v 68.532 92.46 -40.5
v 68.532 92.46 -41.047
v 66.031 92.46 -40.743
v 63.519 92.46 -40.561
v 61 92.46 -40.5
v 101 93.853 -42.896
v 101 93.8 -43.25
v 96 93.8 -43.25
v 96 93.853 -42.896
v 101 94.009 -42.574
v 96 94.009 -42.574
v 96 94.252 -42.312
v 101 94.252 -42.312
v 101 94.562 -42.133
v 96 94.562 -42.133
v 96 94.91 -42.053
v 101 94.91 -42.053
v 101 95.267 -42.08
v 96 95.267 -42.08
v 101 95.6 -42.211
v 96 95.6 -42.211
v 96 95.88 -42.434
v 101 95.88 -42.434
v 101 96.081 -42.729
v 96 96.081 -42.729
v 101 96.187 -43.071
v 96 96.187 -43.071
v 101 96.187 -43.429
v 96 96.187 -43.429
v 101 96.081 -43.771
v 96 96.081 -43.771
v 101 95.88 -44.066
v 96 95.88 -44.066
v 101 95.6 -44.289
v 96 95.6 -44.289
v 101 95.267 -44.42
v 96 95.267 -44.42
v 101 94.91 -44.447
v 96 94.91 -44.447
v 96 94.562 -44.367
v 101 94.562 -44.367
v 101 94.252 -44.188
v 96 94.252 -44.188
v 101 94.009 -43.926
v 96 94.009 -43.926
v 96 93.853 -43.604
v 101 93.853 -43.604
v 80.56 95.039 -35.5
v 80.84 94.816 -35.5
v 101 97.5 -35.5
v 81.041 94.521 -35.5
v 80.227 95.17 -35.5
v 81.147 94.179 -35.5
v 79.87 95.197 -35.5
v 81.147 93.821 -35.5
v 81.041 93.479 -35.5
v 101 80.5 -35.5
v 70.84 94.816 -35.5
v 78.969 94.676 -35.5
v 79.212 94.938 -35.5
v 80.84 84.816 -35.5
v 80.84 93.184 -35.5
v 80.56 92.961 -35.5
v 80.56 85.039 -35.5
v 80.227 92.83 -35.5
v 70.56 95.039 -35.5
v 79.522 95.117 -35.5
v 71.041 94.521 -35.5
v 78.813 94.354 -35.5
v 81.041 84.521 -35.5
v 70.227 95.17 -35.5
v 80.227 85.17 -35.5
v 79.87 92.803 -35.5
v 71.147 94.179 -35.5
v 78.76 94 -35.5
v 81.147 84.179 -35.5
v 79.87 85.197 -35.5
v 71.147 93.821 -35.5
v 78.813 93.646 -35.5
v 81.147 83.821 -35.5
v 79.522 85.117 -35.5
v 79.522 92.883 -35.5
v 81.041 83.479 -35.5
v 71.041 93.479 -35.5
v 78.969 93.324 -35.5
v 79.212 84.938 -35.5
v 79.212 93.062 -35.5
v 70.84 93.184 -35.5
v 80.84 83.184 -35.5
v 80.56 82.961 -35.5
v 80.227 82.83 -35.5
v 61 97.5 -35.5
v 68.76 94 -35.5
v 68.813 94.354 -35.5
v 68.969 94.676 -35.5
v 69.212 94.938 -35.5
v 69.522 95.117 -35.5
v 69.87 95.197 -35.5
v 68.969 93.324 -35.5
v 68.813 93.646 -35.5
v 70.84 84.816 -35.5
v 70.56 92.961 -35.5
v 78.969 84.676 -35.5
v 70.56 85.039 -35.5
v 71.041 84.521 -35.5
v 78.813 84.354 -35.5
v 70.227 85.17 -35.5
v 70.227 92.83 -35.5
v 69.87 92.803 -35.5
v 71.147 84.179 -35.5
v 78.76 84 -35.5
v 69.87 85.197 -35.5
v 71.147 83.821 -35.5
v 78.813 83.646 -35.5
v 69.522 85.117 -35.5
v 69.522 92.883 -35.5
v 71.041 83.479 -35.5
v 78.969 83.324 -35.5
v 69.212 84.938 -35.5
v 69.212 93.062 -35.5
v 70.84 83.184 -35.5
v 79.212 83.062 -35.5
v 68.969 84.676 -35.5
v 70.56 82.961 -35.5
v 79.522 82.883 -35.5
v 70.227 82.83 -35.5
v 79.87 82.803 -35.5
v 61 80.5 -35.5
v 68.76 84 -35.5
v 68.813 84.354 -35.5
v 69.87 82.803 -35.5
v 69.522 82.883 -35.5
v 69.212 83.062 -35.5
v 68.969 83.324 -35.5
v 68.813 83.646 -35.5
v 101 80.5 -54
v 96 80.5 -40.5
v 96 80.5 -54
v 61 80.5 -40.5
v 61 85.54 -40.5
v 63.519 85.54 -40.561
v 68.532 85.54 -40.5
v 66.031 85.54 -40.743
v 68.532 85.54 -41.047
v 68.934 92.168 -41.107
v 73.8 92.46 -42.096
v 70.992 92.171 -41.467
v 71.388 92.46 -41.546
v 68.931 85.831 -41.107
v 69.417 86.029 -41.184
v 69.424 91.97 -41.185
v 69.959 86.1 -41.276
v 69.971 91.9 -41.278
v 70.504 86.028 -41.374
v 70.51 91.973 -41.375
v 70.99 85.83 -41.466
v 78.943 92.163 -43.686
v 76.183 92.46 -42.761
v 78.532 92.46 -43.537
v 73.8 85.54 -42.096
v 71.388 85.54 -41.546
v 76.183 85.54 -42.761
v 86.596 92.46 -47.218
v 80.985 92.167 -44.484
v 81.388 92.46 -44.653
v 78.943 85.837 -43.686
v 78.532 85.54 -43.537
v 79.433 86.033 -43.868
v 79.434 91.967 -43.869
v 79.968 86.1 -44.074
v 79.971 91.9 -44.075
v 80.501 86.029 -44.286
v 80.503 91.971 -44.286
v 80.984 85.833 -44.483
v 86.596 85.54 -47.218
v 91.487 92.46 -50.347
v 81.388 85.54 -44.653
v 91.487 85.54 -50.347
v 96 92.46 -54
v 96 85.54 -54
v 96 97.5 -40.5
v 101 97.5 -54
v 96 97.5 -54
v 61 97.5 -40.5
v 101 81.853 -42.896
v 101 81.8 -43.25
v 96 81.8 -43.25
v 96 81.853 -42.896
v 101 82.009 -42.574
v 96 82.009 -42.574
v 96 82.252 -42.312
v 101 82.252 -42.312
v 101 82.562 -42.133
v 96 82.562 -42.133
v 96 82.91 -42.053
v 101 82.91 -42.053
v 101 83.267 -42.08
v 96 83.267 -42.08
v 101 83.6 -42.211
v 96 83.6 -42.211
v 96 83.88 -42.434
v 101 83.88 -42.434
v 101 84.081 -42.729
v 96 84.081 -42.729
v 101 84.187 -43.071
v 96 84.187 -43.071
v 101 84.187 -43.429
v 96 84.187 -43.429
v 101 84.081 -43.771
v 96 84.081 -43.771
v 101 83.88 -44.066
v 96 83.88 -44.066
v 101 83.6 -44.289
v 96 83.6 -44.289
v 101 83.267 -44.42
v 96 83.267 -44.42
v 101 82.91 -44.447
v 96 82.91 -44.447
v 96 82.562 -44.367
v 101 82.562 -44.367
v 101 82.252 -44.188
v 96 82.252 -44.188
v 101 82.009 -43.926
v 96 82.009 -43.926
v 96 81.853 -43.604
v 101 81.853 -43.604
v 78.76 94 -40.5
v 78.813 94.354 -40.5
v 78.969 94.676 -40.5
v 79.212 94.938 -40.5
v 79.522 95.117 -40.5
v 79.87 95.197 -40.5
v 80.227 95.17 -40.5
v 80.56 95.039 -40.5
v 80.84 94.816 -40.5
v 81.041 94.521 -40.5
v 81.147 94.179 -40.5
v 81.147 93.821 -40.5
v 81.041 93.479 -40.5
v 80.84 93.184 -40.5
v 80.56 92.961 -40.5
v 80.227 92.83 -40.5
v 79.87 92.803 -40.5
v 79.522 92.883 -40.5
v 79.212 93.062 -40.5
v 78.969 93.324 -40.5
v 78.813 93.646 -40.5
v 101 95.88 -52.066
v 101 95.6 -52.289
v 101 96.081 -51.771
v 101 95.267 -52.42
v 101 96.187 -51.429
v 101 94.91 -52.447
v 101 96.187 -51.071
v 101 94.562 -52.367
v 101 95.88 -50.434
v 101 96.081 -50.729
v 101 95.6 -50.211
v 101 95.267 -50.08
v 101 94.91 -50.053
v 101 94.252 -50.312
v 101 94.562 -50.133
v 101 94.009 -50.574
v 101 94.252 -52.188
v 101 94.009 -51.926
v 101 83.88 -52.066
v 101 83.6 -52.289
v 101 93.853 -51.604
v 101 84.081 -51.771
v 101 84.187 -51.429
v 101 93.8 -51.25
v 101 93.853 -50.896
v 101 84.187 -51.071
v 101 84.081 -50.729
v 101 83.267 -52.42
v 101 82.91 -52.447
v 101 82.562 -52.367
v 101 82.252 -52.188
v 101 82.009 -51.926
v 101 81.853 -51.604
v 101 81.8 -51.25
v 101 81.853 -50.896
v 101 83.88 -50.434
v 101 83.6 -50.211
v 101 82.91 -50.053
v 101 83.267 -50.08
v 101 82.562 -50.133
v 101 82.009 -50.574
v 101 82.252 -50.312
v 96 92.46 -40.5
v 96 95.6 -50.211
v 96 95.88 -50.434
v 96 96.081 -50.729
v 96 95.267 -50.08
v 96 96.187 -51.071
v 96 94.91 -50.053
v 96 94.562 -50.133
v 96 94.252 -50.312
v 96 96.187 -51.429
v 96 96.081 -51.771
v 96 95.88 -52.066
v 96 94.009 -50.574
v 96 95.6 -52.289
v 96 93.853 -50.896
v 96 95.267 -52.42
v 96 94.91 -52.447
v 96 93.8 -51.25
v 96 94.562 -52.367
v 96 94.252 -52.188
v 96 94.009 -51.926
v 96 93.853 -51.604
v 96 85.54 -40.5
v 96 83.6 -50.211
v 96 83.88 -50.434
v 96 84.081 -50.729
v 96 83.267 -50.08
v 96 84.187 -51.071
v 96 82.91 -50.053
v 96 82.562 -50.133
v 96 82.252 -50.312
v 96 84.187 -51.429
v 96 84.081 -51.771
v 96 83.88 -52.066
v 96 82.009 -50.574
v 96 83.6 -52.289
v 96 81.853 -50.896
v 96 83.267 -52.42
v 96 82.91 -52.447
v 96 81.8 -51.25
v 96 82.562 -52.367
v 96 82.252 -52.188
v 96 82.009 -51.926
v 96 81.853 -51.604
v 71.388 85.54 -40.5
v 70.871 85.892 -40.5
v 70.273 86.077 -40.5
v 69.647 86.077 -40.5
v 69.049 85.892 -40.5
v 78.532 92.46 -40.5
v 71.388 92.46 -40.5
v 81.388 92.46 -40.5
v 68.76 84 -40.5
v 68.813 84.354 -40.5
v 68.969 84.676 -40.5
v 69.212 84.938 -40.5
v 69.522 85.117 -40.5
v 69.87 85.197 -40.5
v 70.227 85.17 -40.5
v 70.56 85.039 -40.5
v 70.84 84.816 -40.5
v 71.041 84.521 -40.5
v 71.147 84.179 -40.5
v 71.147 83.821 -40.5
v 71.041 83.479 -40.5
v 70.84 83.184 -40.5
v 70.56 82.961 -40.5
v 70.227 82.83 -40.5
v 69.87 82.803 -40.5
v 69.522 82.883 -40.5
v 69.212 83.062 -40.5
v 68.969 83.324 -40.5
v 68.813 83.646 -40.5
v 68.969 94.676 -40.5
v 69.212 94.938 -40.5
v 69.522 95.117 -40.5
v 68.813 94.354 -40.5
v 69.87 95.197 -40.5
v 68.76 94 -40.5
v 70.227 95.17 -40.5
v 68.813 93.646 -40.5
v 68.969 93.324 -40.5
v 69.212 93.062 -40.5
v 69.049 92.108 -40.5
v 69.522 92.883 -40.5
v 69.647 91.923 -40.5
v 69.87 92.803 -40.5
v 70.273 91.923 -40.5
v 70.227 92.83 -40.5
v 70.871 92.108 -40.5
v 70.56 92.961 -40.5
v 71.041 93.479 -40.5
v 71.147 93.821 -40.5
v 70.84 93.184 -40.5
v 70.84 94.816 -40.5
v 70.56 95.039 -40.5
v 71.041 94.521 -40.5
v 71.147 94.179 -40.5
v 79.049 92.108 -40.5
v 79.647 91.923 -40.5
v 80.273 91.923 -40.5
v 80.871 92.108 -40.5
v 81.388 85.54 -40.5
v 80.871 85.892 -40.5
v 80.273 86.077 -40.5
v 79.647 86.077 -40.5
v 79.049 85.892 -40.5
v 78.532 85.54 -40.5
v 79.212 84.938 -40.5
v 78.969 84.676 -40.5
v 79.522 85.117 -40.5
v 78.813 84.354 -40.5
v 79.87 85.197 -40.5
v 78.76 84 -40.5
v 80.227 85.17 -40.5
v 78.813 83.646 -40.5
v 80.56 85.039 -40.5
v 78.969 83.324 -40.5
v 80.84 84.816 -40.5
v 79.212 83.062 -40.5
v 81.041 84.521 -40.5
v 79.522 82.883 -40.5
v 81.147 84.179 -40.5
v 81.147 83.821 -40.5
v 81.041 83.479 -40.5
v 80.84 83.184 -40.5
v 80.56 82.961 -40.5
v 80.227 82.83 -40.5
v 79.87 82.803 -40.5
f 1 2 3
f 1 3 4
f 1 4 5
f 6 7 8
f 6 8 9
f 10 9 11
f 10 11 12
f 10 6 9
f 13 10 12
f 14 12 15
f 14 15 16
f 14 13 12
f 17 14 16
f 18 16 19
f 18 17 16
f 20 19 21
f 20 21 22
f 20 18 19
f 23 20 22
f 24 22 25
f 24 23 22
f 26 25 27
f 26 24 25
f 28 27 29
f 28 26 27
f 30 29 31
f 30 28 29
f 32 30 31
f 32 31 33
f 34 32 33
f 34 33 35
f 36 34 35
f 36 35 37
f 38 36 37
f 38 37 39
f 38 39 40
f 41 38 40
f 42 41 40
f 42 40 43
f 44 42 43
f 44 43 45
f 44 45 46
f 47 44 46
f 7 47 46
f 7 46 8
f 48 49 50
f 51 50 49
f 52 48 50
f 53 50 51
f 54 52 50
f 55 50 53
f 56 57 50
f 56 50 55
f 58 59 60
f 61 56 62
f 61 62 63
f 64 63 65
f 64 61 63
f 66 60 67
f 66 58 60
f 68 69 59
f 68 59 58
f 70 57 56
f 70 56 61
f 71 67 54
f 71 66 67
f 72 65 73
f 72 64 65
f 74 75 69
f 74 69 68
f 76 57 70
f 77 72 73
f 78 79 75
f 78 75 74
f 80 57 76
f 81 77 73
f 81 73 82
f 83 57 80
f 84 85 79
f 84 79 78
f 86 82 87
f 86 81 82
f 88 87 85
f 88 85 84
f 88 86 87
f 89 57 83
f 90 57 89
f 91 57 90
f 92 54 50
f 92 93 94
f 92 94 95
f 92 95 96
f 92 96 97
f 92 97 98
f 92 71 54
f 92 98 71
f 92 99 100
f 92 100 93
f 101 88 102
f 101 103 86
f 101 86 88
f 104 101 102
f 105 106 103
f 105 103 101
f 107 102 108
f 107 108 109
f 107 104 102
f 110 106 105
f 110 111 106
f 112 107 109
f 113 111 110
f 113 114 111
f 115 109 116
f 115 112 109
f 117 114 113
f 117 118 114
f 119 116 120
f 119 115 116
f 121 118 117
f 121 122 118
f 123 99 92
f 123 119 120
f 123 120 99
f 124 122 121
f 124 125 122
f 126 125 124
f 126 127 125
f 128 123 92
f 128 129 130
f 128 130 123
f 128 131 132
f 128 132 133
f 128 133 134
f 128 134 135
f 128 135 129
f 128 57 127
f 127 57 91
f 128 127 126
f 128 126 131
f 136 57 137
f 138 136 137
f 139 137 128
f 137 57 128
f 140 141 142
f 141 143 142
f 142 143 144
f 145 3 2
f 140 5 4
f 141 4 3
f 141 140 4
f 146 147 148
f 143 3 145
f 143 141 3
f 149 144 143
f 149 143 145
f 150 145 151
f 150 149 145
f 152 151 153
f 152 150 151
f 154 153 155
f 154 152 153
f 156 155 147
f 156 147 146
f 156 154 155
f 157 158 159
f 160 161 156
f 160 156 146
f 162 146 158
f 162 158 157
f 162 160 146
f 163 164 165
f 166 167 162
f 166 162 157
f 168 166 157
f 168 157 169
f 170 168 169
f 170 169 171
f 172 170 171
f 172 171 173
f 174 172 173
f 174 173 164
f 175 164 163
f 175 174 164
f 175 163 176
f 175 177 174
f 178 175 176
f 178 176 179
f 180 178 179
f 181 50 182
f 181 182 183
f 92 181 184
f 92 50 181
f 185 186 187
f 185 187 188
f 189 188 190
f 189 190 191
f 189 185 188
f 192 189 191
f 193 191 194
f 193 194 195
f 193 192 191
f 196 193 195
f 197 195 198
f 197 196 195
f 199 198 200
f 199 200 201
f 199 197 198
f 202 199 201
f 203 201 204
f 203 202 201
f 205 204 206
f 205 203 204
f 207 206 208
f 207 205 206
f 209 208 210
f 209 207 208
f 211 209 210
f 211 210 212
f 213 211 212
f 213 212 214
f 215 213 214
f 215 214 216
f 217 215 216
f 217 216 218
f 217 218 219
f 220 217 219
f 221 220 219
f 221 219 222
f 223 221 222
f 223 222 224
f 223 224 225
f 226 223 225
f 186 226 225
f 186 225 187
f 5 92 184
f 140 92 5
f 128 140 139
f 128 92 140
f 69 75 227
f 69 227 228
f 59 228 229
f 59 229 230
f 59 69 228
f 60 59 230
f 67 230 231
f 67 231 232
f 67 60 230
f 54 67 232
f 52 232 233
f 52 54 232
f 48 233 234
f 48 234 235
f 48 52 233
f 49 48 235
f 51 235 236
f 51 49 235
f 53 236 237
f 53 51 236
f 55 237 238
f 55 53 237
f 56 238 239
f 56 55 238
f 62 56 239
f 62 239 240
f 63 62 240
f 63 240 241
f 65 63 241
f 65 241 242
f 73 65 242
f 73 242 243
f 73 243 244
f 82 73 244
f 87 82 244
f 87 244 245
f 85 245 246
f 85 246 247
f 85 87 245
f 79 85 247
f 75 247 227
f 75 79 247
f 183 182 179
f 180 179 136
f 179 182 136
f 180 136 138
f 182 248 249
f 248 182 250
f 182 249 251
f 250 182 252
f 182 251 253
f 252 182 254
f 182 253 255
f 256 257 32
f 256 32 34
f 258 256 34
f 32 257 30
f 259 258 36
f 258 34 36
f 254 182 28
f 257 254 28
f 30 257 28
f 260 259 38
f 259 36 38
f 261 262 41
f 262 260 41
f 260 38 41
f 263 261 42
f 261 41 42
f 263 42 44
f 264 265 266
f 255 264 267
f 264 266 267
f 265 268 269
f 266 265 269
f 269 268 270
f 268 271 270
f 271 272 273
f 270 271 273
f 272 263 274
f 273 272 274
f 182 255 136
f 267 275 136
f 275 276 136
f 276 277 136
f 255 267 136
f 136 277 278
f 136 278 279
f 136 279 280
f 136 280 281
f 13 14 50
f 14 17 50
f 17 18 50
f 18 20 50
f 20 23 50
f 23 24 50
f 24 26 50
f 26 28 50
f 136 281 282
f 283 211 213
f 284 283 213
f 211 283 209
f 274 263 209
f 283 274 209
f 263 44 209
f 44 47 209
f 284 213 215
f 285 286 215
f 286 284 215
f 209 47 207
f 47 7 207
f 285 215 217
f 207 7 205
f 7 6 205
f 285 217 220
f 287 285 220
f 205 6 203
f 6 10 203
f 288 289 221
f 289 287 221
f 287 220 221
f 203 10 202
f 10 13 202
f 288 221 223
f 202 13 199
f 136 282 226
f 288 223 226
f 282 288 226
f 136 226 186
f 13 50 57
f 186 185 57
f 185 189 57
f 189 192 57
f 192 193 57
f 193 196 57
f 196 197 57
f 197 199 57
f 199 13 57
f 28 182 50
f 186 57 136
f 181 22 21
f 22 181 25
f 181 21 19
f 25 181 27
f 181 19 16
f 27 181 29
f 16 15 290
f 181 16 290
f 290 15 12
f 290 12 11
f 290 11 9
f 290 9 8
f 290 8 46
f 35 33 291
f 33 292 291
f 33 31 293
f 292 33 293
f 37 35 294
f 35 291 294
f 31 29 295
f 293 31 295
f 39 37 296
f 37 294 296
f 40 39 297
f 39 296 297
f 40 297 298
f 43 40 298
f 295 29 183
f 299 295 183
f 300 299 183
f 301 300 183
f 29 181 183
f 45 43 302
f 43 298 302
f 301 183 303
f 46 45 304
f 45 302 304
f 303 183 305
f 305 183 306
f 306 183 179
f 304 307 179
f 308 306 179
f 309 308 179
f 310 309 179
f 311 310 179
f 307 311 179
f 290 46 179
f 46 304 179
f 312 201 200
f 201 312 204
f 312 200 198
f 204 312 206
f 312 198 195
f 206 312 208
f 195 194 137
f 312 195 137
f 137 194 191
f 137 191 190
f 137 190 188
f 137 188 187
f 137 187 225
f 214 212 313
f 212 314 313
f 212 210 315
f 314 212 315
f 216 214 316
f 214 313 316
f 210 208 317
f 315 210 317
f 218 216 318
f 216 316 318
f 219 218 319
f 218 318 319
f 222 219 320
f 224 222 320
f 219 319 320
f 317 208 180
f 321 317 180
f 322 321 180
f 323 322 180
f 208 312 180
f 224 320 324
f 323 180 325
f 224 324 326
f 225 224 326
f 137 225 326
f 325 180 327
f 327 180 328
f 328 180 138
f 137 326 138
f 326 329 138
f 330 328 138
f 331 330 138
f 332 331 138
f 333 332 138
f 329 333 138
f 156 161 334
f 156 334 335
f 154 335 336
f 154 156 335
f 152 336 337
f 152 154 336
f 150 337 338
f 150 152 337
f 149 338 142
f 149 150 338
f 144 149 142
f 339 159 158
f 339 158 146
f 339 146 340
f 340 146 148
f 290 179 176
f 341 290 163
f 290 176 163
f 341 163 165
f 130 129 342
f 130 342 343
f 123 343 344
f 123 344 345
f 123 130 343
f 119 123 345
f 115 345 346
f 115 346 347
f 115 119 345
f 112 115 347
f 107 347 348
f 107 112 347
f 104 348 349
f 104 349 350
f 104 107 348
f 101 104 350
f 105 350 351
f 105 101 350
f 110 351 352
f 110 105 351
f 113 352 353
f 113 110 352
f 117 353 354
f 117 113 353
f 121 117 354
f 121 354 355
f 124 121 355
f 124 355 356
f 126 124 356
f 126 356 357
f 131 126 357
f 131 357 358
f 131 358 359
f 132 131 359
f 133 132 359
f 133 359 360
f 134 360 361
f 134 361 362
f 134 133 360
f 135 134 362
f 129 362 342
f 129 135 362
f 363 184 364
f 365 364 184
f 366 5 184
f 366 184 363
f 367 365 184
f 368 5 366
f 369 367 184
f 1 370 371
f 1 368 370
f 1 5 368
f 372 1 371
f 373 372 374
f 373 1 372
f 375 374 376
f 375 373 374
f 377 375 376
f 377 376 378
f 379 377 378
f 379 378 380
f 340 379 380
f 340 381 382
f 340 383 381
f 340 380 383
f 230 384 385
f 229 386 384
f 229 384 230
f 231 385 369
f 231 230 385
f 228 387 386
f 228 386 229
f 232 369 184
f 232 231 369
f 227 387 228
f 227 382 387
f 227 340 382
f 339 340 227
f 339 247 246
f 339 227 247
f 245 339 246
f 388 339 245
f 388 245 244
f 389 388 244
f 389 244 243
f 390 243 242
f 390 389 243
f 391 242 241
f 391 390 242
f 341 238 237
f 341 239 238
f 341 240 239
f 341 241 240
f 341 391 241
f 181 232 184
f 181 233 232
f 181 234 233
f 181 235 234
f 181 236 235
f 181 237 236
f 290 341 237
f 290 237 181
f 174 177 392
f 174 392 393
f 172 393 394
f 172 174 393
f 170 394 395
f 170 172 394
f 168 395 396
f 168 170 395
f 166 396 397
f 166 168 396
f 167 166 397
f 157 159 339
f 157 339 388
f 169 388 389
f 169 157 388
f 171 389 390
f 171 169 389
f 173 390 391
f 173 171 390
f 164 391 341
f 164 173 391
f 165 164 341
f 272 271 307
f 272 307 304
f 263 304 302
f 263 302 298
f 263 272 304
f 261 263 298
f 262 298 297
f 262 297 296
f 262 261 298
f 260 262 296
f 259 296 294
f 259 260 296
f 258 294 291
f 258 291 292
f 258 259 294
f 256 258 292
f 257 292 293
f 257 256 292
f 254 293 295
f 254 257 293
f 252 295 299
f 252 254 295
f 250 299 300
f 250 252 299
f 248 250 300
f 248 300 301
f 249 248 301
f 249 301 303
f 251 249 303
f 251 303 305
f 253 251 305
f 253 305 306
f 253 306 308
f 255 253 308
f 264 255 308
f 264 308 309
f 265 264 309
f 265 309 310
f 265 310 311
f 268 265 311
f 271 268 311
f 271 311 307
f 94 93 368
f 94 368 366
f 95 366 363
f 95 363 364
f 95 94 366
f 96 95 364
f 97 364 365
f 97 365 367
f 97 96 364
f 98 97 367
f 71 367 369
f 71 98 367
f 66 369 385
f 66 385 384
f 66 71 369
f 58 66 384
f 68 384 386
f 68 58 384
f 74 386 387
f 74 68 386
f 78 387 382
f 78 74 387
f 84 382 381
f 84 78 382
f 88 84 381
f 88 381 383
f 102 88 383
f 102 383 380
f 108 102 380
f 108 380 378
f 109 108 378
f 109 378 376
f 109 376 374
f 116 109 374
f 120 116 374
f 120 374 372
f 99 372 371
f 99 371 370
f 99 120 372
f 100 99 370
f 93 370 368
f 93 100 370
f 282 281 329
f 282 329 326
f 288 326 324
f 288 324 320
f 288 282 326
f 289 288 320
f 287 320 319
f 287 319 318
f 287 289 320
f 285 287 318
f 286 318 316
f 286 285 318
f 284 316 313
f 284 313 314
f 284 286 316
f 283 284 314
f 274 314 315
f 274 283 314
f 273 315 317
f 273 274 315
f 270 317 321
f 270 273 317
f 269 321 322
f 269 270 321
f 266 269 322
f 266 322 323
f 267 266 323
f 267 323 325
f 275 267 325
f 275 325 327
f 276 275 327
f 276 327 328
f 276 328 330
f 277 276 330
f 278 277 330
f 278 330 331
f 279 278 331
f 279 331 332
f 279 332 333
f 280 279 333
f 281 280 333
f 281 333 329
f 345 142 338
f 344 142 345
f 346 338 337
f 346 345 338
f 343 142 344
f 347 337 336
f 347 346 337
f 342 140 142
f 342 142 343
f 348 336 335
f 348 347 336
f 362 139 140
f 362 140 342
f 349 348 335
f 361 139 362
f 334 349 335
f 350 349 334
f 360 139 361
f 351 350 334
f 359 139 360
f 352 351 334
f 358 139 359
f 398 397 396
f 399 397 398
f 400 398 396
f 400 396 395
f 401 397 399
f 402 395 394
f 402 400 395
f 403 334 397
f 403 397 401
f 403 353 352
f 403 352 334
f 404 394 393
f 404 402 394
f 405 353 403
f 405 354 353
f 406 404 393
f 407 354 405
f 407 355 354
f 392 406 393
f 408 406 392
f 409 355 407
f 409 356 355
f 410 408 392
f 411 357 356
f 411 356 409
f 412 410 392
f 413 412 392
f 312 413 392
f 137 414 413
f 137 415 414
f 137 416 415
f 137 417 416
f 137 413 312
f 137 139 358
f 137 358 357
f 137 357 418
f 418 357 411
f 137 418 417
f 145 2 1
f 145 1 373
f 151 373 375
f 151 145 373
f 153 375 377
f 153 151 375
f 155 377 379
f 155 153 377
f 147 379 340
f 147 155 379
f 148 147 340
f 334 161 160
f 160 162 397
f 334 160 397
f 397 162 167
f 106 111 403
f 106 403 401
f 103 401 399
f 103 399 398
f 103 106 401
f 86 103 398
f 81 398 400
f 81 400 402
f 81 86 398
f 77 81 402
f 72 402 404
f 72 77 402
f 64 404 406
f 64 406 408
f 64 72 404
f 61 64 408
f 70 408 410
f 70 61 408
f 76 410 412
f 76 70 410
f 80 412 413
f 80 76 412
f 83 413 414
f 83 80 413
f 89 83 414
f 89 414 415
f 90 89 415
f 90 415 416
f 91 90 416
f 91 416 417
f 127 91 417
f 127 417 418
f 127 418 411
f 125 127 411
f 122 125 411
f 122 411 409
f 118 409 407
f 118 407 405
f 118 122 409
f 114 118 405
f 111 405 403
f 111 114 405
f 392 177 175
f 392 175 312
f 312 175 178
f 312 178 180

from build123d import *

# Parameters (mm, degrees)
SKETCH005_W     = 40
SKETCH005_H     = 17
PAD002_DEPTH    = 18.5
POCKET003_DEPTH = 17
SKETCH007_R     = 1.2
POCKET004_DEPTH = 40
POCKET005_DEPTH = 13.5
SKETCH009_R     = 1.2
POCKET006_DEPTH = 5
SKETCH010_R     = 2.1
POCKET007_DEPTH = 13.5


with BuildPart() as yzconnectorbody:
    # Sketch005 (on Face1 of ReferencePocket002) → Pad002 (new body)
    with BuildSketch(Plane(origin=(0, 0, -10), x_dir=(1, 0, 0), z_dir=(0, 0, -1))):
        with Locations((-81, -91.5)):
            Rectangle(SKETCH005_W, SKETCH005_H)
    extrude(amount=PAD002_DEPTH)

    # Sketch006 (on Face4 of Pad002) → Pocket003 (cut)
    with BuildSketch(Plane(origin=(0, 83, -10), x_dir=(1, 0, 0), z_dir=(0, -1, 0))):
        with BuildLine():
            ThreePointArc((-61, -5), (-79.756665, -8.491978), (-96, -18.5))
            Line((-96, -18.5), (-61, -18.5))
            Line((-61, -5), (-61, -18.5))
        make_face()
    extrude(amount=-POCKET003_DEPTH, mode=Mode.SUBTRACT)

    # Sketch007 (on Face6 of Pocket003) → Pocket004 (cut)
    with BuildSketch(Plane(origin=(-101, 0, -10), x_dir=(0, -1, 0), z_dir=(-1, 0, 0))):
        with Locations((-97.5, -7.75)):
            Circle(SKETCH007_R)
        with Locations((-85.5, -7.75)):
            Circle(SKETCH007_R)
        with Locations((-97.5, -15.75)):
            Circle(SKETCH007_R)
        with Locations((-85.5, -15.75)):
            Circle(SKETCH007_R)
    extrude(amount=-POCKET004_DEPTH, mode=Mode.SUBTRACT)

    # Sketch008 (on Face7 of Pocket004) → Pocket005 (cut)
    with BuildSketch(Plane(origin=(0, 0, -28.5), x_dir=(1, 0, 0), z_dir=(0, 0, -1))):
        Polygon((-96, -83), (-61, -83), (-51, -83), (-51, -100), (-61, -100), (-96, -100), (-96, -94.96), (-61, -94.96), (-61, -88.04), (-96, -88.04), align=None)
    extrude(amount=-POCKET005_DEPTH, mode=Mode.SUBTRACT)

    # Sketch009 (on Face2 of Pocket005) → Pocket006 (cut)
    with BuildSketch(Plane.XY.offset(-10)):
        with Locations((-69.96, 96.5)):
            Circle(SKETCH009_R)
        with Locations((-69.96, 86.5)):
            Circle(SKETCH009_R)
        with Locations((-79.96, 96.5)):
            Circle(SKETCH009_R)
        with Locations((-79.96, 86.5)):
            Circle(SKETCH009_R)
    extrude(amount=-POCKET006_DEPTH, mode=Mode.SUBTRACT)

    # Sketch010 (on Face13 of Pocket006) → Pocket007 (cut)
    with BuildSketch(Plane(origin=(0, 0, -28.5), x_dir=(1, 0, 0), z_dir=(0, 0, -1))):
        with Locations((-79.96, -86.5)):
            Circle(SKETCH010_R)
        with Locations((-69.96, -86.5)):
            Circle(SKETCH010_R)
        with Locations((-69.96, -96.5)):
            Circle(SKETCH010_R)
        with Locations((-79.96, -96.5)):
            Circle(SKETCH010_R)
    extrude(amount=-POCKET007_DEPTH, mode=Mode.SUBTRACT)


with BuildPart() as yzconnectorbody_1:
    # Body002 placement: moved
    add(yzconnectorbody.part.moved(Location((0, -2.5, -25.5))))


with BuildPart() as part_mirroring:
    # Part__Mirroring: instance of YZConnectorBody
    add(yzconnectorbody_1.part.mirror(Plane(origin=(0, 0, 0), x_dir=(0, -1, 0), z_dir=(1, 0, 0))))


solid = part_mirroring.part
